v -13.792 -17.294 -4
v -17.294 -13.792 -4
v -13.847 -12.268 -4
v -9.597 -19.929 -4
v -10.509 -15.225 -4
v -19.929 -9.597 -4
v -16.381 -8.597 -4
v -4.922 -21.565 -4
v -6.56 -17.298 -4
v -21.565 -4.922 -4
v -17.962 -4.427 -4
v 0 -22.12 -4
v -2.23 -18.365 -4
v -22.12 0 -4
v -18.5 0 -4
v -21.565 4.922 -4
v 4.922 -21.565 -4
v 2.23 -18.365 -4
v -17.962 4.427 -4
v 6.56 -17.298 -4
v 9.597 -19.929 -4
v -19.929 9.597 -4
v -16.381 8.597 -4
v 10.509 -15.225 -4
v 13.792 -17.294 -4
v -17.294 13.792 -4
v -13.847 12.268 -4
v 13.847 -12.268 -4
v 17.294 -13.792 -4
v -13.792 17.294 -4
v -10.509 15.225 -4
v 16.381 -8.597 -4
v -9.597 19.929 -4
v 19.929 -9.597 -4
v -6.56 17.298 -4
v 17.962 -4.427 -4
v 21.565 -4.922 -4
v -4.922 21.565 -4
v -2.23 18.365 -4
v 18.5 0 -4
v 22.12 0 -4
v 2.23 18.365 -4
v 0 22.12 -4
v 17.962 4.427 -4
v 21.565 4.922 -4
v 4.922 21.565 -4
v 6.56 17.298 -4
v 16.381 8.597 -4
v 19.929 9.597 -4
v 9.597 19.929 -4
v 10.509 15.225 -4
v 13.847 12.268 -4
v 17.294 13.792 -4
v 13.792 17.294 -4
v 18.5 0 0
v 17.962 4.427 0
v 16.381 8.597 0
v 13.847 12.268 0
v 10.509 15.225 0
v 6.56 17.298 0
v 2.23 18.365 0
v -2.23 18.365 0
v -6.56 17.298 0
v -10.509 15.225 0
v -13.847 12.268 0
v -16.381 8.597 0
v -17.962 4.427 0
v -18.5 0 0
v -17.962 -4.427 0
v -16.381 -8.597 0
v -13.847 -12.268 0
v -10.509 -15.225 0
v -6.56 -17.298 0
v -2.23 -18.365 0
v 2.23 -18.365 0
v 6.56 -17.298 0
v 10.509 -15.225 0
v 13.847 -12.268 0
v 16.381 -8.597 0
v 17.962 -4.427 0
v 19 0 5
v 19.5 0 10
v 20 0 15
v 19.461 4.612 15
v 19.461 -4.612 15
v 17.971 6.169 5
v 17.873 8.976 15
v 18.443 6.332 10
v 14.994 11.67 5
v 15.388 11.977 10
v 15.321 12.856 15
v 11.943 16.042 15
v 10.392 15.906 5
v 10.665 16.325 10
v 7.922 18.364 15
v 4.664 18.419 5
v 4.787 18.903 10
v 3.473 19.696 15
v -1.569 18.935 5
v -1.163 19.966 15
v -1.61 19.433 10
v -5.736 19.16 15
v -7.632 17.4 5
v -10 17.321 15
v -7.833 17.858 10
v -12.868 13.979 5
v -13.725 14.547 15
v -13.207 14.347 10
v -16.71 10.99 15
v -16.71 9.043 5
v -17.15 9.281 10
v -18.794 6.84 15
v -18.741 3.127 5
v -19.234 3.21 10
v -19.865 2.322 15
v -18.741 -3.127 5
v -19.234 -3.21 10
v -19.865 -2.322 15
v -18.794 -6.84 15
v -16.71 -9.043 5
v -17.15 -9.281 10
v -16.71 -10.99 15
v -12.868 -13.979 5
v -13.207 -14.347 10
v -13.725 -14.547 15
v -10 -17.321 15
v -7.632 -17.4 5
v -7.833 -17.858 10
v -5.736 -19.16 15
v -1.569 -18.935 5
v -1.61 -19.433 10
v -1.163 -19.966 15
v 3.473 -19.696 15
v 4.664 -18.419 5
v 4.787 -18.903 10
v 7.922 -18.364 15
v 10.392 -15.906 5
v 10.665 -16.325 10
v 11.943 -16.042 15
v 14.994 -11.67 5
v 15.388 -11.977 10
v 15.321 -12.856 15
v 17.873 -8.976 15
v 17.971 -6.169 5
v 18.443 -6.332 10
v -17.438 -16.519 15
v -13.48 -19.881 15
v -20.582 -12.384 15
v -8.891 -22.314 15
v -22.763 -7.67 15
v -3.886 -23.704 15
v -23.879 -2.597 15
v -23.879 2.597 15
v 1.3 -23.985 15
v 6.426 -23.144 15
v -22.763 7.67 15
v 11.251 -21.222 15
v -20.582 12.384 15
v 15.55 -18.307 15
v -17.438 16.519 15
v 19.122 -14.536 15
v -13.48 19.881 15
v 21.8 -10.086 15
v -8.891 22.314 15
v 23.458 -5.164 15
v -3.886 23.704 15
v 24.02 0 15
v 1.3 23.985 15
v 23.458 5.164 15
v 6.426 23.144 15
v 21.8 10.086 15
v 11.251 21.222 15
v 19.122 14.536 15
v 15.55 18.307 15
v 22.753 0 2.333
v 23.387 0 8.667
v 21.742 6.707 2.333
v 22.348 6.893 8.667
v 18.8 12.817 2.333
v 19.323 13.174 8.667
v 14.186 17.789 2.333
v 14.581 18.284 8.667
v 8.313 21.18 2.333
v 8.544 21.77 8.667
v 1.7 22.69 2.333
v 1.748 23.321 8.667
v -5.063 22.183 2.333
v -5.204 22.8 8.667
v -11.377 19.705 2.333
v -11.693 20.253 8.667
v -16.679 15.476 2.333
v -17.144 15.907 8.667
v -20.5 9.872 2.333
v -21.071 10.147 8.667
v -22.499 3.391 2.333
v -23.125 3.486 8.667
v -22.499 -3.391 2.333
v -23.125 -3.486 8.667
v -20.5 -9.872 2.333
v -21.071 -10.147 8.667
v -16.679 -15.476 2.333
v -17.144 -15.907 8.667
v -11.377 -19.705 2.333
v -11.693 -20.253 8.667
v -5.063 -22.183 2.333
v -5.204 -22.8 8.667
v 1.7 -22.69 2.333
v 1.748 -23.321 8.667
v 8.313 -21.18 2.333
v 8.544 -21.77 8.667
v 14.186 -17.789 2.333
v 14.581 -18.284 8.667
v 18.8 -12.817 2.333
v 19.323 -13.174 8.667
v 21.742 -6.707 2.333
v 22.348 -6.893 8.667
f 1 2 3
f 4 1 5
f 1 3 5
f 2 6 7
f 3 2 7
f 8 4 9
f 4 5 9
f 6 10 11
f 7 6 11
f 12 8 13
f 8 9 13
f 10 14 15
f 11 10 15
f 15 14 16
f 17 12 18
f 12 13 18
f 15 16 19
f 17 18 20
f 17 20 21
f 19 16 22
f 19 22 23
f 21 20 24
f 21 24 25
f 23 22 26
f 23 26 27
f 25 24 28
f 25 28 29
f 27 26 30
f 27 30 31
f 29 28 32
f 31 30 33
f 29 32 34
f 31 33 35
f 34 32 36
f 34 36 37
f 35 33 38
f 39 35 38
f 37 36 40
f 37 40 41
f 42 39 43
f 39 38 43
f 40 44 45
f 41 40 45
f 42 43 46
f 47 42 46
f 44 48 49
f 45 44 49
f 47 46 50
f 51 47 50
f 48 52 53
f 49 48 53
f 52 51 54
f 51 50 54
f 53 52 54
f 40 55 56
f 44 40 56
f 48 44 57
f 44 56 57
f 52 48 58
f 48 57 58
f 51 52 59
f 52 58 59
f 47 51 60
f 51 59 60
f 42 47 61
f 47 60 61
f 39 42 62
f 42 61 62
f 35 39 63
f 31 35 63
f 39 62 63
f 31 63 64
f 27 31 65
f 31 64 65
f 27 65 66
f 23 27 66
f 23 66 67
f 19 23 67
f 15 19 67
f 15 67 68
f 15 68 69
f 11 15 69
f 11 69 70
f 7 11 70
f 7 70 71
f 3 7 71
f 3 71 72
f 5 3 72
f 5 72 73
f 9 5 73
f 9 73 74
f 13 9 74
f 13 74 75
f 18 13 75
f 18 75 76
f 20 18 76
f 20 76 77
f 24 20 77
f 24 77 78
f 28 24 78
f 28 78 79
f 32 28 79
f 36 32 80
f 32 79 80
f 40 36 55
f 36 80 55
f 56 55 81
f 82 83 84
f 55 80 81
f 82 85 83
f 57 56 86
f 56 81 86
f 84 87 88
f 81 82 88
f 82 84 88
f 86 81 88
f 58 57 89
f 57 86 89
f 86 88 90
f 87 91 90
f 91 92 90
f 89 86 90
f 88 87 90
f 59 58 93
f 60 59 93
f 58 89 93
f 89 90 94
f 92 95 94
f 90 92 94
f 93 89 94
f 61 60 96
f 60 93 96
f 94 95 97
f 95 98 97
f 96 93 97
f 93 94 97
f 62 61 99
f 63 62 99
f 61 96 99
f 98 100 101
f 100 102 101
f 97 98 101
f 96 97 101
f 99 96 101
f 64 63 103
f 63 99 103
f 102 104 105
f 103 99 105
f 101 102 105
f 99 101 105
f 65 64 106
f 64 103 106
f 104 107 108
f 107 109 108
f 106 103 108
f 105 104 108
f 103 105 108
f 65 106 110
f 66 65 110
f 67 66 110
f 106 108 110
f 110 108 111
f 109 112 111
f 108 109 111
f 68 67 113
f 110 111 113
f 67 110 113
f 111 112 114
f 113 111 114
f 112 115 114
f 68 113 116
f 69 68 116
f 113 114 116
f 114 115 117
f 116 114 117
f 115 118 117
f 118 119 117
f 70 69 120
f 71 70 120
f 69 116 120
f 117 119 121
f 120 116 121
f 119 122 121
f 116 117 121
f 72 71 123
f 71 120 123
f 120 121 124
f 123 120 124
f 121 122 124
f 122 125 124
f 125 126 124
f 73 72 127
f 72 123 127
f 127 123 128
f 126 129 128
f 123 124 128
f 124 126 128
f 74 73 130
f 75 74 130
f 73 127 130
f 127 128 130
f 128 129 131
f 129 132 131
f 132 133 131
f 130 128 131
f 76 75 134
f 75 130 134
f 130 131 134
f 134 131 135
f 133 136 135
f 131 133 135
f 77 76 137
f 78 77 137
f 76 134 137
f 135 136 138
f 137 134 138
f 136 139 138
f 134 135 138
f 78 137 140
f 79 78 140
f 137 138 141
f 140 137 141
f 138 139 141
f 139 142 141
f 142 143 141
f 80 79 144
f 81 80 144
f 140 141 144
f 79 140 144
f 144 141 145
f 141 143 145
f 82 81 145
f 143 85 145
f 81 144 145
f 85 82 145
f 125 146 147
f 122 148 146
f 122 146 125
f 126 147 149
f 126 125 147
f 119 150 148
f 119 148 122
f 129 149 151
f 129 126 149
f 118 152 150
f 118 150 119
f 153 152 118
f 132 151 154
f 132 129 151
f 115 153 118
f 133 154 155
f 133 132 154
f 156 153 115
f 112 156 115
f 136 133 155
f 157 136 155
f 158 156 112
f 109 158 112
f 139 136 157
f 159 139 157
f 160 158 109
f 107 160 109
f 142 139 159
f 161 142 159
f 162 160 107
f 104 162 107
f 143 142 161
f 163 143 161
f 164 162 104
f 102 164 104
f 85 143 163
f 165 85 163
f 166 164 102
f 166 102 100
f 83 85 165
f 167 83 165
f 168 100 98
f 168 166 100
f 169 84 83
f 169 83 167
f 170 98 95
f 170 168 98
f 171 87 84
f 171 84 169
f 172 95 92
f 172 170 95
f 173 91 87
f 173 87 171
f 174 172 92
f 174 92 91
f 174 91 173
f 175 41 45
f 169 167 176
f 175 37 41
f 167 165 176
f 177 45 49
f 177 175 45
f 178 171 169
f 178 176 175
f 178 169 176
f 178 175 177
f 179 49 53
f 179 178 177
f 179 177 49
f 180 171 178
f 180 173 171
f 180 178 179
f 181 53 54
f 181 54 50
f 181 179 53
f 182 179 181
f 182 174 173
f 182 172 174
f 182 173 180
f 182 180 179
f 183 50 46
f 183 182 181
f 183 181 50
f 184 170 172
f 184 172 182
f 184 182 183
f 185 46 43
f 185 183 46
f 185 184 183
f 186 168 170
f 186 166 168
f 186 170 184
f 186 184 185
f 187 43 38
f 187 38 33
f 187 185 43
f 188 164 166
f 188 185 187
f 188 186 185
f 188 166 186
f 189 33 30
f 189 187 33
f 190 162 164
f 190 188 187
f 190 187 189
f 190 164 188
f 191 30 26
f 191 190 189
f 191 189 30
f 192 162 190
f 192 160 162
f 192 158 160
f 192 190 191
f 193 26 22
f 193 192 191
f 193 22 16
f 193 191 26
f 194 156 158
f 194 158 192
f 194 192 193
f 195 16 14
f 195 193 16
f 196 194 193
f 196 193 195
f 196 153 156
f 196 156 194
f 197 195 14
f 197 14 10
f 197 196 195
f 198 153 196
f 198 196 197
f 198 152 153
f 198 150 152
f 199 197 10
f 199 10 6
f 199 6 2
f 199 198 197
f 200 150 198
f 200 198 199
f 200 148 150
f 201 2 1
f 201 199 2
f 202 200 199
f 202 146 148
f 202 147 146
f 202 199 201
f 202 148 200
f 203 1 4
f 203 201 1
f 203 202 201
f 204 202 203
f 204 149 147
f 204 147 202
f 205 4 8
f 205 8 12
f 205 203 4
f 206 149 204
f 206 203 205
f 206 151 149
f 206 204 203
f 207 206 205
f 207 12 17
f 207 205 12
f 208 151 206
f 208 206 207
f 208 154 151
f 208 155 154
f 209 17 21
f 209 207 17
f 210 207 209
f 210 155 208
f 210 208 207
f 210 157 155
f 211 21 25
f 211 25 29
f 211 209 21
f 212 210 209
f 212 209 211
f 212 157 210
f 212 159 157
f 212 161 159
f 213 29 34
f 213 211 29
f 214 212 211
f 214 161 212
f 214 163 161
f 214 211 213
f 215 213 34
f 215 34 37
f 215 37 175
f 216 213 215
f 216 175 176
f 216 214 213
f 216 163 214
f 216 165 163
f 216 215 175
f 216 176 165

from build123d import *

# Parameters (mm, degrees)
F0_R     = 18.5
F2_R     = 20
F4_T     = 4
F5_R     = 18.5
F6_DEPTH = 25


with BuildPart() as f3:
    # F0 (on Top) → F3 section 0
    with BuildSketch(Plane.XY):
        Circle(F0_R)
    # F2 (on offset) → F3 section 1
    with BuildSketch(Plane.XY.offset(15)):
        Circle(F2_R)
    loft()

    # F4
    f4_openings = [f3.faces().sort_by_distance(p)[0] for p in [
        (0, 0, 15),
    ]]
    offset(amount=F4_T, openings=f4_openings, kind=Kind.INTERSECTION)

    # F5 (on face) → F6 (cut)
    with BuildSketch(Plane.XY):
        Circle(F5_R)
    extrude(amount=-F6_DEPTH, mode=Mode.SUBTRACT)


solid = f3.part
